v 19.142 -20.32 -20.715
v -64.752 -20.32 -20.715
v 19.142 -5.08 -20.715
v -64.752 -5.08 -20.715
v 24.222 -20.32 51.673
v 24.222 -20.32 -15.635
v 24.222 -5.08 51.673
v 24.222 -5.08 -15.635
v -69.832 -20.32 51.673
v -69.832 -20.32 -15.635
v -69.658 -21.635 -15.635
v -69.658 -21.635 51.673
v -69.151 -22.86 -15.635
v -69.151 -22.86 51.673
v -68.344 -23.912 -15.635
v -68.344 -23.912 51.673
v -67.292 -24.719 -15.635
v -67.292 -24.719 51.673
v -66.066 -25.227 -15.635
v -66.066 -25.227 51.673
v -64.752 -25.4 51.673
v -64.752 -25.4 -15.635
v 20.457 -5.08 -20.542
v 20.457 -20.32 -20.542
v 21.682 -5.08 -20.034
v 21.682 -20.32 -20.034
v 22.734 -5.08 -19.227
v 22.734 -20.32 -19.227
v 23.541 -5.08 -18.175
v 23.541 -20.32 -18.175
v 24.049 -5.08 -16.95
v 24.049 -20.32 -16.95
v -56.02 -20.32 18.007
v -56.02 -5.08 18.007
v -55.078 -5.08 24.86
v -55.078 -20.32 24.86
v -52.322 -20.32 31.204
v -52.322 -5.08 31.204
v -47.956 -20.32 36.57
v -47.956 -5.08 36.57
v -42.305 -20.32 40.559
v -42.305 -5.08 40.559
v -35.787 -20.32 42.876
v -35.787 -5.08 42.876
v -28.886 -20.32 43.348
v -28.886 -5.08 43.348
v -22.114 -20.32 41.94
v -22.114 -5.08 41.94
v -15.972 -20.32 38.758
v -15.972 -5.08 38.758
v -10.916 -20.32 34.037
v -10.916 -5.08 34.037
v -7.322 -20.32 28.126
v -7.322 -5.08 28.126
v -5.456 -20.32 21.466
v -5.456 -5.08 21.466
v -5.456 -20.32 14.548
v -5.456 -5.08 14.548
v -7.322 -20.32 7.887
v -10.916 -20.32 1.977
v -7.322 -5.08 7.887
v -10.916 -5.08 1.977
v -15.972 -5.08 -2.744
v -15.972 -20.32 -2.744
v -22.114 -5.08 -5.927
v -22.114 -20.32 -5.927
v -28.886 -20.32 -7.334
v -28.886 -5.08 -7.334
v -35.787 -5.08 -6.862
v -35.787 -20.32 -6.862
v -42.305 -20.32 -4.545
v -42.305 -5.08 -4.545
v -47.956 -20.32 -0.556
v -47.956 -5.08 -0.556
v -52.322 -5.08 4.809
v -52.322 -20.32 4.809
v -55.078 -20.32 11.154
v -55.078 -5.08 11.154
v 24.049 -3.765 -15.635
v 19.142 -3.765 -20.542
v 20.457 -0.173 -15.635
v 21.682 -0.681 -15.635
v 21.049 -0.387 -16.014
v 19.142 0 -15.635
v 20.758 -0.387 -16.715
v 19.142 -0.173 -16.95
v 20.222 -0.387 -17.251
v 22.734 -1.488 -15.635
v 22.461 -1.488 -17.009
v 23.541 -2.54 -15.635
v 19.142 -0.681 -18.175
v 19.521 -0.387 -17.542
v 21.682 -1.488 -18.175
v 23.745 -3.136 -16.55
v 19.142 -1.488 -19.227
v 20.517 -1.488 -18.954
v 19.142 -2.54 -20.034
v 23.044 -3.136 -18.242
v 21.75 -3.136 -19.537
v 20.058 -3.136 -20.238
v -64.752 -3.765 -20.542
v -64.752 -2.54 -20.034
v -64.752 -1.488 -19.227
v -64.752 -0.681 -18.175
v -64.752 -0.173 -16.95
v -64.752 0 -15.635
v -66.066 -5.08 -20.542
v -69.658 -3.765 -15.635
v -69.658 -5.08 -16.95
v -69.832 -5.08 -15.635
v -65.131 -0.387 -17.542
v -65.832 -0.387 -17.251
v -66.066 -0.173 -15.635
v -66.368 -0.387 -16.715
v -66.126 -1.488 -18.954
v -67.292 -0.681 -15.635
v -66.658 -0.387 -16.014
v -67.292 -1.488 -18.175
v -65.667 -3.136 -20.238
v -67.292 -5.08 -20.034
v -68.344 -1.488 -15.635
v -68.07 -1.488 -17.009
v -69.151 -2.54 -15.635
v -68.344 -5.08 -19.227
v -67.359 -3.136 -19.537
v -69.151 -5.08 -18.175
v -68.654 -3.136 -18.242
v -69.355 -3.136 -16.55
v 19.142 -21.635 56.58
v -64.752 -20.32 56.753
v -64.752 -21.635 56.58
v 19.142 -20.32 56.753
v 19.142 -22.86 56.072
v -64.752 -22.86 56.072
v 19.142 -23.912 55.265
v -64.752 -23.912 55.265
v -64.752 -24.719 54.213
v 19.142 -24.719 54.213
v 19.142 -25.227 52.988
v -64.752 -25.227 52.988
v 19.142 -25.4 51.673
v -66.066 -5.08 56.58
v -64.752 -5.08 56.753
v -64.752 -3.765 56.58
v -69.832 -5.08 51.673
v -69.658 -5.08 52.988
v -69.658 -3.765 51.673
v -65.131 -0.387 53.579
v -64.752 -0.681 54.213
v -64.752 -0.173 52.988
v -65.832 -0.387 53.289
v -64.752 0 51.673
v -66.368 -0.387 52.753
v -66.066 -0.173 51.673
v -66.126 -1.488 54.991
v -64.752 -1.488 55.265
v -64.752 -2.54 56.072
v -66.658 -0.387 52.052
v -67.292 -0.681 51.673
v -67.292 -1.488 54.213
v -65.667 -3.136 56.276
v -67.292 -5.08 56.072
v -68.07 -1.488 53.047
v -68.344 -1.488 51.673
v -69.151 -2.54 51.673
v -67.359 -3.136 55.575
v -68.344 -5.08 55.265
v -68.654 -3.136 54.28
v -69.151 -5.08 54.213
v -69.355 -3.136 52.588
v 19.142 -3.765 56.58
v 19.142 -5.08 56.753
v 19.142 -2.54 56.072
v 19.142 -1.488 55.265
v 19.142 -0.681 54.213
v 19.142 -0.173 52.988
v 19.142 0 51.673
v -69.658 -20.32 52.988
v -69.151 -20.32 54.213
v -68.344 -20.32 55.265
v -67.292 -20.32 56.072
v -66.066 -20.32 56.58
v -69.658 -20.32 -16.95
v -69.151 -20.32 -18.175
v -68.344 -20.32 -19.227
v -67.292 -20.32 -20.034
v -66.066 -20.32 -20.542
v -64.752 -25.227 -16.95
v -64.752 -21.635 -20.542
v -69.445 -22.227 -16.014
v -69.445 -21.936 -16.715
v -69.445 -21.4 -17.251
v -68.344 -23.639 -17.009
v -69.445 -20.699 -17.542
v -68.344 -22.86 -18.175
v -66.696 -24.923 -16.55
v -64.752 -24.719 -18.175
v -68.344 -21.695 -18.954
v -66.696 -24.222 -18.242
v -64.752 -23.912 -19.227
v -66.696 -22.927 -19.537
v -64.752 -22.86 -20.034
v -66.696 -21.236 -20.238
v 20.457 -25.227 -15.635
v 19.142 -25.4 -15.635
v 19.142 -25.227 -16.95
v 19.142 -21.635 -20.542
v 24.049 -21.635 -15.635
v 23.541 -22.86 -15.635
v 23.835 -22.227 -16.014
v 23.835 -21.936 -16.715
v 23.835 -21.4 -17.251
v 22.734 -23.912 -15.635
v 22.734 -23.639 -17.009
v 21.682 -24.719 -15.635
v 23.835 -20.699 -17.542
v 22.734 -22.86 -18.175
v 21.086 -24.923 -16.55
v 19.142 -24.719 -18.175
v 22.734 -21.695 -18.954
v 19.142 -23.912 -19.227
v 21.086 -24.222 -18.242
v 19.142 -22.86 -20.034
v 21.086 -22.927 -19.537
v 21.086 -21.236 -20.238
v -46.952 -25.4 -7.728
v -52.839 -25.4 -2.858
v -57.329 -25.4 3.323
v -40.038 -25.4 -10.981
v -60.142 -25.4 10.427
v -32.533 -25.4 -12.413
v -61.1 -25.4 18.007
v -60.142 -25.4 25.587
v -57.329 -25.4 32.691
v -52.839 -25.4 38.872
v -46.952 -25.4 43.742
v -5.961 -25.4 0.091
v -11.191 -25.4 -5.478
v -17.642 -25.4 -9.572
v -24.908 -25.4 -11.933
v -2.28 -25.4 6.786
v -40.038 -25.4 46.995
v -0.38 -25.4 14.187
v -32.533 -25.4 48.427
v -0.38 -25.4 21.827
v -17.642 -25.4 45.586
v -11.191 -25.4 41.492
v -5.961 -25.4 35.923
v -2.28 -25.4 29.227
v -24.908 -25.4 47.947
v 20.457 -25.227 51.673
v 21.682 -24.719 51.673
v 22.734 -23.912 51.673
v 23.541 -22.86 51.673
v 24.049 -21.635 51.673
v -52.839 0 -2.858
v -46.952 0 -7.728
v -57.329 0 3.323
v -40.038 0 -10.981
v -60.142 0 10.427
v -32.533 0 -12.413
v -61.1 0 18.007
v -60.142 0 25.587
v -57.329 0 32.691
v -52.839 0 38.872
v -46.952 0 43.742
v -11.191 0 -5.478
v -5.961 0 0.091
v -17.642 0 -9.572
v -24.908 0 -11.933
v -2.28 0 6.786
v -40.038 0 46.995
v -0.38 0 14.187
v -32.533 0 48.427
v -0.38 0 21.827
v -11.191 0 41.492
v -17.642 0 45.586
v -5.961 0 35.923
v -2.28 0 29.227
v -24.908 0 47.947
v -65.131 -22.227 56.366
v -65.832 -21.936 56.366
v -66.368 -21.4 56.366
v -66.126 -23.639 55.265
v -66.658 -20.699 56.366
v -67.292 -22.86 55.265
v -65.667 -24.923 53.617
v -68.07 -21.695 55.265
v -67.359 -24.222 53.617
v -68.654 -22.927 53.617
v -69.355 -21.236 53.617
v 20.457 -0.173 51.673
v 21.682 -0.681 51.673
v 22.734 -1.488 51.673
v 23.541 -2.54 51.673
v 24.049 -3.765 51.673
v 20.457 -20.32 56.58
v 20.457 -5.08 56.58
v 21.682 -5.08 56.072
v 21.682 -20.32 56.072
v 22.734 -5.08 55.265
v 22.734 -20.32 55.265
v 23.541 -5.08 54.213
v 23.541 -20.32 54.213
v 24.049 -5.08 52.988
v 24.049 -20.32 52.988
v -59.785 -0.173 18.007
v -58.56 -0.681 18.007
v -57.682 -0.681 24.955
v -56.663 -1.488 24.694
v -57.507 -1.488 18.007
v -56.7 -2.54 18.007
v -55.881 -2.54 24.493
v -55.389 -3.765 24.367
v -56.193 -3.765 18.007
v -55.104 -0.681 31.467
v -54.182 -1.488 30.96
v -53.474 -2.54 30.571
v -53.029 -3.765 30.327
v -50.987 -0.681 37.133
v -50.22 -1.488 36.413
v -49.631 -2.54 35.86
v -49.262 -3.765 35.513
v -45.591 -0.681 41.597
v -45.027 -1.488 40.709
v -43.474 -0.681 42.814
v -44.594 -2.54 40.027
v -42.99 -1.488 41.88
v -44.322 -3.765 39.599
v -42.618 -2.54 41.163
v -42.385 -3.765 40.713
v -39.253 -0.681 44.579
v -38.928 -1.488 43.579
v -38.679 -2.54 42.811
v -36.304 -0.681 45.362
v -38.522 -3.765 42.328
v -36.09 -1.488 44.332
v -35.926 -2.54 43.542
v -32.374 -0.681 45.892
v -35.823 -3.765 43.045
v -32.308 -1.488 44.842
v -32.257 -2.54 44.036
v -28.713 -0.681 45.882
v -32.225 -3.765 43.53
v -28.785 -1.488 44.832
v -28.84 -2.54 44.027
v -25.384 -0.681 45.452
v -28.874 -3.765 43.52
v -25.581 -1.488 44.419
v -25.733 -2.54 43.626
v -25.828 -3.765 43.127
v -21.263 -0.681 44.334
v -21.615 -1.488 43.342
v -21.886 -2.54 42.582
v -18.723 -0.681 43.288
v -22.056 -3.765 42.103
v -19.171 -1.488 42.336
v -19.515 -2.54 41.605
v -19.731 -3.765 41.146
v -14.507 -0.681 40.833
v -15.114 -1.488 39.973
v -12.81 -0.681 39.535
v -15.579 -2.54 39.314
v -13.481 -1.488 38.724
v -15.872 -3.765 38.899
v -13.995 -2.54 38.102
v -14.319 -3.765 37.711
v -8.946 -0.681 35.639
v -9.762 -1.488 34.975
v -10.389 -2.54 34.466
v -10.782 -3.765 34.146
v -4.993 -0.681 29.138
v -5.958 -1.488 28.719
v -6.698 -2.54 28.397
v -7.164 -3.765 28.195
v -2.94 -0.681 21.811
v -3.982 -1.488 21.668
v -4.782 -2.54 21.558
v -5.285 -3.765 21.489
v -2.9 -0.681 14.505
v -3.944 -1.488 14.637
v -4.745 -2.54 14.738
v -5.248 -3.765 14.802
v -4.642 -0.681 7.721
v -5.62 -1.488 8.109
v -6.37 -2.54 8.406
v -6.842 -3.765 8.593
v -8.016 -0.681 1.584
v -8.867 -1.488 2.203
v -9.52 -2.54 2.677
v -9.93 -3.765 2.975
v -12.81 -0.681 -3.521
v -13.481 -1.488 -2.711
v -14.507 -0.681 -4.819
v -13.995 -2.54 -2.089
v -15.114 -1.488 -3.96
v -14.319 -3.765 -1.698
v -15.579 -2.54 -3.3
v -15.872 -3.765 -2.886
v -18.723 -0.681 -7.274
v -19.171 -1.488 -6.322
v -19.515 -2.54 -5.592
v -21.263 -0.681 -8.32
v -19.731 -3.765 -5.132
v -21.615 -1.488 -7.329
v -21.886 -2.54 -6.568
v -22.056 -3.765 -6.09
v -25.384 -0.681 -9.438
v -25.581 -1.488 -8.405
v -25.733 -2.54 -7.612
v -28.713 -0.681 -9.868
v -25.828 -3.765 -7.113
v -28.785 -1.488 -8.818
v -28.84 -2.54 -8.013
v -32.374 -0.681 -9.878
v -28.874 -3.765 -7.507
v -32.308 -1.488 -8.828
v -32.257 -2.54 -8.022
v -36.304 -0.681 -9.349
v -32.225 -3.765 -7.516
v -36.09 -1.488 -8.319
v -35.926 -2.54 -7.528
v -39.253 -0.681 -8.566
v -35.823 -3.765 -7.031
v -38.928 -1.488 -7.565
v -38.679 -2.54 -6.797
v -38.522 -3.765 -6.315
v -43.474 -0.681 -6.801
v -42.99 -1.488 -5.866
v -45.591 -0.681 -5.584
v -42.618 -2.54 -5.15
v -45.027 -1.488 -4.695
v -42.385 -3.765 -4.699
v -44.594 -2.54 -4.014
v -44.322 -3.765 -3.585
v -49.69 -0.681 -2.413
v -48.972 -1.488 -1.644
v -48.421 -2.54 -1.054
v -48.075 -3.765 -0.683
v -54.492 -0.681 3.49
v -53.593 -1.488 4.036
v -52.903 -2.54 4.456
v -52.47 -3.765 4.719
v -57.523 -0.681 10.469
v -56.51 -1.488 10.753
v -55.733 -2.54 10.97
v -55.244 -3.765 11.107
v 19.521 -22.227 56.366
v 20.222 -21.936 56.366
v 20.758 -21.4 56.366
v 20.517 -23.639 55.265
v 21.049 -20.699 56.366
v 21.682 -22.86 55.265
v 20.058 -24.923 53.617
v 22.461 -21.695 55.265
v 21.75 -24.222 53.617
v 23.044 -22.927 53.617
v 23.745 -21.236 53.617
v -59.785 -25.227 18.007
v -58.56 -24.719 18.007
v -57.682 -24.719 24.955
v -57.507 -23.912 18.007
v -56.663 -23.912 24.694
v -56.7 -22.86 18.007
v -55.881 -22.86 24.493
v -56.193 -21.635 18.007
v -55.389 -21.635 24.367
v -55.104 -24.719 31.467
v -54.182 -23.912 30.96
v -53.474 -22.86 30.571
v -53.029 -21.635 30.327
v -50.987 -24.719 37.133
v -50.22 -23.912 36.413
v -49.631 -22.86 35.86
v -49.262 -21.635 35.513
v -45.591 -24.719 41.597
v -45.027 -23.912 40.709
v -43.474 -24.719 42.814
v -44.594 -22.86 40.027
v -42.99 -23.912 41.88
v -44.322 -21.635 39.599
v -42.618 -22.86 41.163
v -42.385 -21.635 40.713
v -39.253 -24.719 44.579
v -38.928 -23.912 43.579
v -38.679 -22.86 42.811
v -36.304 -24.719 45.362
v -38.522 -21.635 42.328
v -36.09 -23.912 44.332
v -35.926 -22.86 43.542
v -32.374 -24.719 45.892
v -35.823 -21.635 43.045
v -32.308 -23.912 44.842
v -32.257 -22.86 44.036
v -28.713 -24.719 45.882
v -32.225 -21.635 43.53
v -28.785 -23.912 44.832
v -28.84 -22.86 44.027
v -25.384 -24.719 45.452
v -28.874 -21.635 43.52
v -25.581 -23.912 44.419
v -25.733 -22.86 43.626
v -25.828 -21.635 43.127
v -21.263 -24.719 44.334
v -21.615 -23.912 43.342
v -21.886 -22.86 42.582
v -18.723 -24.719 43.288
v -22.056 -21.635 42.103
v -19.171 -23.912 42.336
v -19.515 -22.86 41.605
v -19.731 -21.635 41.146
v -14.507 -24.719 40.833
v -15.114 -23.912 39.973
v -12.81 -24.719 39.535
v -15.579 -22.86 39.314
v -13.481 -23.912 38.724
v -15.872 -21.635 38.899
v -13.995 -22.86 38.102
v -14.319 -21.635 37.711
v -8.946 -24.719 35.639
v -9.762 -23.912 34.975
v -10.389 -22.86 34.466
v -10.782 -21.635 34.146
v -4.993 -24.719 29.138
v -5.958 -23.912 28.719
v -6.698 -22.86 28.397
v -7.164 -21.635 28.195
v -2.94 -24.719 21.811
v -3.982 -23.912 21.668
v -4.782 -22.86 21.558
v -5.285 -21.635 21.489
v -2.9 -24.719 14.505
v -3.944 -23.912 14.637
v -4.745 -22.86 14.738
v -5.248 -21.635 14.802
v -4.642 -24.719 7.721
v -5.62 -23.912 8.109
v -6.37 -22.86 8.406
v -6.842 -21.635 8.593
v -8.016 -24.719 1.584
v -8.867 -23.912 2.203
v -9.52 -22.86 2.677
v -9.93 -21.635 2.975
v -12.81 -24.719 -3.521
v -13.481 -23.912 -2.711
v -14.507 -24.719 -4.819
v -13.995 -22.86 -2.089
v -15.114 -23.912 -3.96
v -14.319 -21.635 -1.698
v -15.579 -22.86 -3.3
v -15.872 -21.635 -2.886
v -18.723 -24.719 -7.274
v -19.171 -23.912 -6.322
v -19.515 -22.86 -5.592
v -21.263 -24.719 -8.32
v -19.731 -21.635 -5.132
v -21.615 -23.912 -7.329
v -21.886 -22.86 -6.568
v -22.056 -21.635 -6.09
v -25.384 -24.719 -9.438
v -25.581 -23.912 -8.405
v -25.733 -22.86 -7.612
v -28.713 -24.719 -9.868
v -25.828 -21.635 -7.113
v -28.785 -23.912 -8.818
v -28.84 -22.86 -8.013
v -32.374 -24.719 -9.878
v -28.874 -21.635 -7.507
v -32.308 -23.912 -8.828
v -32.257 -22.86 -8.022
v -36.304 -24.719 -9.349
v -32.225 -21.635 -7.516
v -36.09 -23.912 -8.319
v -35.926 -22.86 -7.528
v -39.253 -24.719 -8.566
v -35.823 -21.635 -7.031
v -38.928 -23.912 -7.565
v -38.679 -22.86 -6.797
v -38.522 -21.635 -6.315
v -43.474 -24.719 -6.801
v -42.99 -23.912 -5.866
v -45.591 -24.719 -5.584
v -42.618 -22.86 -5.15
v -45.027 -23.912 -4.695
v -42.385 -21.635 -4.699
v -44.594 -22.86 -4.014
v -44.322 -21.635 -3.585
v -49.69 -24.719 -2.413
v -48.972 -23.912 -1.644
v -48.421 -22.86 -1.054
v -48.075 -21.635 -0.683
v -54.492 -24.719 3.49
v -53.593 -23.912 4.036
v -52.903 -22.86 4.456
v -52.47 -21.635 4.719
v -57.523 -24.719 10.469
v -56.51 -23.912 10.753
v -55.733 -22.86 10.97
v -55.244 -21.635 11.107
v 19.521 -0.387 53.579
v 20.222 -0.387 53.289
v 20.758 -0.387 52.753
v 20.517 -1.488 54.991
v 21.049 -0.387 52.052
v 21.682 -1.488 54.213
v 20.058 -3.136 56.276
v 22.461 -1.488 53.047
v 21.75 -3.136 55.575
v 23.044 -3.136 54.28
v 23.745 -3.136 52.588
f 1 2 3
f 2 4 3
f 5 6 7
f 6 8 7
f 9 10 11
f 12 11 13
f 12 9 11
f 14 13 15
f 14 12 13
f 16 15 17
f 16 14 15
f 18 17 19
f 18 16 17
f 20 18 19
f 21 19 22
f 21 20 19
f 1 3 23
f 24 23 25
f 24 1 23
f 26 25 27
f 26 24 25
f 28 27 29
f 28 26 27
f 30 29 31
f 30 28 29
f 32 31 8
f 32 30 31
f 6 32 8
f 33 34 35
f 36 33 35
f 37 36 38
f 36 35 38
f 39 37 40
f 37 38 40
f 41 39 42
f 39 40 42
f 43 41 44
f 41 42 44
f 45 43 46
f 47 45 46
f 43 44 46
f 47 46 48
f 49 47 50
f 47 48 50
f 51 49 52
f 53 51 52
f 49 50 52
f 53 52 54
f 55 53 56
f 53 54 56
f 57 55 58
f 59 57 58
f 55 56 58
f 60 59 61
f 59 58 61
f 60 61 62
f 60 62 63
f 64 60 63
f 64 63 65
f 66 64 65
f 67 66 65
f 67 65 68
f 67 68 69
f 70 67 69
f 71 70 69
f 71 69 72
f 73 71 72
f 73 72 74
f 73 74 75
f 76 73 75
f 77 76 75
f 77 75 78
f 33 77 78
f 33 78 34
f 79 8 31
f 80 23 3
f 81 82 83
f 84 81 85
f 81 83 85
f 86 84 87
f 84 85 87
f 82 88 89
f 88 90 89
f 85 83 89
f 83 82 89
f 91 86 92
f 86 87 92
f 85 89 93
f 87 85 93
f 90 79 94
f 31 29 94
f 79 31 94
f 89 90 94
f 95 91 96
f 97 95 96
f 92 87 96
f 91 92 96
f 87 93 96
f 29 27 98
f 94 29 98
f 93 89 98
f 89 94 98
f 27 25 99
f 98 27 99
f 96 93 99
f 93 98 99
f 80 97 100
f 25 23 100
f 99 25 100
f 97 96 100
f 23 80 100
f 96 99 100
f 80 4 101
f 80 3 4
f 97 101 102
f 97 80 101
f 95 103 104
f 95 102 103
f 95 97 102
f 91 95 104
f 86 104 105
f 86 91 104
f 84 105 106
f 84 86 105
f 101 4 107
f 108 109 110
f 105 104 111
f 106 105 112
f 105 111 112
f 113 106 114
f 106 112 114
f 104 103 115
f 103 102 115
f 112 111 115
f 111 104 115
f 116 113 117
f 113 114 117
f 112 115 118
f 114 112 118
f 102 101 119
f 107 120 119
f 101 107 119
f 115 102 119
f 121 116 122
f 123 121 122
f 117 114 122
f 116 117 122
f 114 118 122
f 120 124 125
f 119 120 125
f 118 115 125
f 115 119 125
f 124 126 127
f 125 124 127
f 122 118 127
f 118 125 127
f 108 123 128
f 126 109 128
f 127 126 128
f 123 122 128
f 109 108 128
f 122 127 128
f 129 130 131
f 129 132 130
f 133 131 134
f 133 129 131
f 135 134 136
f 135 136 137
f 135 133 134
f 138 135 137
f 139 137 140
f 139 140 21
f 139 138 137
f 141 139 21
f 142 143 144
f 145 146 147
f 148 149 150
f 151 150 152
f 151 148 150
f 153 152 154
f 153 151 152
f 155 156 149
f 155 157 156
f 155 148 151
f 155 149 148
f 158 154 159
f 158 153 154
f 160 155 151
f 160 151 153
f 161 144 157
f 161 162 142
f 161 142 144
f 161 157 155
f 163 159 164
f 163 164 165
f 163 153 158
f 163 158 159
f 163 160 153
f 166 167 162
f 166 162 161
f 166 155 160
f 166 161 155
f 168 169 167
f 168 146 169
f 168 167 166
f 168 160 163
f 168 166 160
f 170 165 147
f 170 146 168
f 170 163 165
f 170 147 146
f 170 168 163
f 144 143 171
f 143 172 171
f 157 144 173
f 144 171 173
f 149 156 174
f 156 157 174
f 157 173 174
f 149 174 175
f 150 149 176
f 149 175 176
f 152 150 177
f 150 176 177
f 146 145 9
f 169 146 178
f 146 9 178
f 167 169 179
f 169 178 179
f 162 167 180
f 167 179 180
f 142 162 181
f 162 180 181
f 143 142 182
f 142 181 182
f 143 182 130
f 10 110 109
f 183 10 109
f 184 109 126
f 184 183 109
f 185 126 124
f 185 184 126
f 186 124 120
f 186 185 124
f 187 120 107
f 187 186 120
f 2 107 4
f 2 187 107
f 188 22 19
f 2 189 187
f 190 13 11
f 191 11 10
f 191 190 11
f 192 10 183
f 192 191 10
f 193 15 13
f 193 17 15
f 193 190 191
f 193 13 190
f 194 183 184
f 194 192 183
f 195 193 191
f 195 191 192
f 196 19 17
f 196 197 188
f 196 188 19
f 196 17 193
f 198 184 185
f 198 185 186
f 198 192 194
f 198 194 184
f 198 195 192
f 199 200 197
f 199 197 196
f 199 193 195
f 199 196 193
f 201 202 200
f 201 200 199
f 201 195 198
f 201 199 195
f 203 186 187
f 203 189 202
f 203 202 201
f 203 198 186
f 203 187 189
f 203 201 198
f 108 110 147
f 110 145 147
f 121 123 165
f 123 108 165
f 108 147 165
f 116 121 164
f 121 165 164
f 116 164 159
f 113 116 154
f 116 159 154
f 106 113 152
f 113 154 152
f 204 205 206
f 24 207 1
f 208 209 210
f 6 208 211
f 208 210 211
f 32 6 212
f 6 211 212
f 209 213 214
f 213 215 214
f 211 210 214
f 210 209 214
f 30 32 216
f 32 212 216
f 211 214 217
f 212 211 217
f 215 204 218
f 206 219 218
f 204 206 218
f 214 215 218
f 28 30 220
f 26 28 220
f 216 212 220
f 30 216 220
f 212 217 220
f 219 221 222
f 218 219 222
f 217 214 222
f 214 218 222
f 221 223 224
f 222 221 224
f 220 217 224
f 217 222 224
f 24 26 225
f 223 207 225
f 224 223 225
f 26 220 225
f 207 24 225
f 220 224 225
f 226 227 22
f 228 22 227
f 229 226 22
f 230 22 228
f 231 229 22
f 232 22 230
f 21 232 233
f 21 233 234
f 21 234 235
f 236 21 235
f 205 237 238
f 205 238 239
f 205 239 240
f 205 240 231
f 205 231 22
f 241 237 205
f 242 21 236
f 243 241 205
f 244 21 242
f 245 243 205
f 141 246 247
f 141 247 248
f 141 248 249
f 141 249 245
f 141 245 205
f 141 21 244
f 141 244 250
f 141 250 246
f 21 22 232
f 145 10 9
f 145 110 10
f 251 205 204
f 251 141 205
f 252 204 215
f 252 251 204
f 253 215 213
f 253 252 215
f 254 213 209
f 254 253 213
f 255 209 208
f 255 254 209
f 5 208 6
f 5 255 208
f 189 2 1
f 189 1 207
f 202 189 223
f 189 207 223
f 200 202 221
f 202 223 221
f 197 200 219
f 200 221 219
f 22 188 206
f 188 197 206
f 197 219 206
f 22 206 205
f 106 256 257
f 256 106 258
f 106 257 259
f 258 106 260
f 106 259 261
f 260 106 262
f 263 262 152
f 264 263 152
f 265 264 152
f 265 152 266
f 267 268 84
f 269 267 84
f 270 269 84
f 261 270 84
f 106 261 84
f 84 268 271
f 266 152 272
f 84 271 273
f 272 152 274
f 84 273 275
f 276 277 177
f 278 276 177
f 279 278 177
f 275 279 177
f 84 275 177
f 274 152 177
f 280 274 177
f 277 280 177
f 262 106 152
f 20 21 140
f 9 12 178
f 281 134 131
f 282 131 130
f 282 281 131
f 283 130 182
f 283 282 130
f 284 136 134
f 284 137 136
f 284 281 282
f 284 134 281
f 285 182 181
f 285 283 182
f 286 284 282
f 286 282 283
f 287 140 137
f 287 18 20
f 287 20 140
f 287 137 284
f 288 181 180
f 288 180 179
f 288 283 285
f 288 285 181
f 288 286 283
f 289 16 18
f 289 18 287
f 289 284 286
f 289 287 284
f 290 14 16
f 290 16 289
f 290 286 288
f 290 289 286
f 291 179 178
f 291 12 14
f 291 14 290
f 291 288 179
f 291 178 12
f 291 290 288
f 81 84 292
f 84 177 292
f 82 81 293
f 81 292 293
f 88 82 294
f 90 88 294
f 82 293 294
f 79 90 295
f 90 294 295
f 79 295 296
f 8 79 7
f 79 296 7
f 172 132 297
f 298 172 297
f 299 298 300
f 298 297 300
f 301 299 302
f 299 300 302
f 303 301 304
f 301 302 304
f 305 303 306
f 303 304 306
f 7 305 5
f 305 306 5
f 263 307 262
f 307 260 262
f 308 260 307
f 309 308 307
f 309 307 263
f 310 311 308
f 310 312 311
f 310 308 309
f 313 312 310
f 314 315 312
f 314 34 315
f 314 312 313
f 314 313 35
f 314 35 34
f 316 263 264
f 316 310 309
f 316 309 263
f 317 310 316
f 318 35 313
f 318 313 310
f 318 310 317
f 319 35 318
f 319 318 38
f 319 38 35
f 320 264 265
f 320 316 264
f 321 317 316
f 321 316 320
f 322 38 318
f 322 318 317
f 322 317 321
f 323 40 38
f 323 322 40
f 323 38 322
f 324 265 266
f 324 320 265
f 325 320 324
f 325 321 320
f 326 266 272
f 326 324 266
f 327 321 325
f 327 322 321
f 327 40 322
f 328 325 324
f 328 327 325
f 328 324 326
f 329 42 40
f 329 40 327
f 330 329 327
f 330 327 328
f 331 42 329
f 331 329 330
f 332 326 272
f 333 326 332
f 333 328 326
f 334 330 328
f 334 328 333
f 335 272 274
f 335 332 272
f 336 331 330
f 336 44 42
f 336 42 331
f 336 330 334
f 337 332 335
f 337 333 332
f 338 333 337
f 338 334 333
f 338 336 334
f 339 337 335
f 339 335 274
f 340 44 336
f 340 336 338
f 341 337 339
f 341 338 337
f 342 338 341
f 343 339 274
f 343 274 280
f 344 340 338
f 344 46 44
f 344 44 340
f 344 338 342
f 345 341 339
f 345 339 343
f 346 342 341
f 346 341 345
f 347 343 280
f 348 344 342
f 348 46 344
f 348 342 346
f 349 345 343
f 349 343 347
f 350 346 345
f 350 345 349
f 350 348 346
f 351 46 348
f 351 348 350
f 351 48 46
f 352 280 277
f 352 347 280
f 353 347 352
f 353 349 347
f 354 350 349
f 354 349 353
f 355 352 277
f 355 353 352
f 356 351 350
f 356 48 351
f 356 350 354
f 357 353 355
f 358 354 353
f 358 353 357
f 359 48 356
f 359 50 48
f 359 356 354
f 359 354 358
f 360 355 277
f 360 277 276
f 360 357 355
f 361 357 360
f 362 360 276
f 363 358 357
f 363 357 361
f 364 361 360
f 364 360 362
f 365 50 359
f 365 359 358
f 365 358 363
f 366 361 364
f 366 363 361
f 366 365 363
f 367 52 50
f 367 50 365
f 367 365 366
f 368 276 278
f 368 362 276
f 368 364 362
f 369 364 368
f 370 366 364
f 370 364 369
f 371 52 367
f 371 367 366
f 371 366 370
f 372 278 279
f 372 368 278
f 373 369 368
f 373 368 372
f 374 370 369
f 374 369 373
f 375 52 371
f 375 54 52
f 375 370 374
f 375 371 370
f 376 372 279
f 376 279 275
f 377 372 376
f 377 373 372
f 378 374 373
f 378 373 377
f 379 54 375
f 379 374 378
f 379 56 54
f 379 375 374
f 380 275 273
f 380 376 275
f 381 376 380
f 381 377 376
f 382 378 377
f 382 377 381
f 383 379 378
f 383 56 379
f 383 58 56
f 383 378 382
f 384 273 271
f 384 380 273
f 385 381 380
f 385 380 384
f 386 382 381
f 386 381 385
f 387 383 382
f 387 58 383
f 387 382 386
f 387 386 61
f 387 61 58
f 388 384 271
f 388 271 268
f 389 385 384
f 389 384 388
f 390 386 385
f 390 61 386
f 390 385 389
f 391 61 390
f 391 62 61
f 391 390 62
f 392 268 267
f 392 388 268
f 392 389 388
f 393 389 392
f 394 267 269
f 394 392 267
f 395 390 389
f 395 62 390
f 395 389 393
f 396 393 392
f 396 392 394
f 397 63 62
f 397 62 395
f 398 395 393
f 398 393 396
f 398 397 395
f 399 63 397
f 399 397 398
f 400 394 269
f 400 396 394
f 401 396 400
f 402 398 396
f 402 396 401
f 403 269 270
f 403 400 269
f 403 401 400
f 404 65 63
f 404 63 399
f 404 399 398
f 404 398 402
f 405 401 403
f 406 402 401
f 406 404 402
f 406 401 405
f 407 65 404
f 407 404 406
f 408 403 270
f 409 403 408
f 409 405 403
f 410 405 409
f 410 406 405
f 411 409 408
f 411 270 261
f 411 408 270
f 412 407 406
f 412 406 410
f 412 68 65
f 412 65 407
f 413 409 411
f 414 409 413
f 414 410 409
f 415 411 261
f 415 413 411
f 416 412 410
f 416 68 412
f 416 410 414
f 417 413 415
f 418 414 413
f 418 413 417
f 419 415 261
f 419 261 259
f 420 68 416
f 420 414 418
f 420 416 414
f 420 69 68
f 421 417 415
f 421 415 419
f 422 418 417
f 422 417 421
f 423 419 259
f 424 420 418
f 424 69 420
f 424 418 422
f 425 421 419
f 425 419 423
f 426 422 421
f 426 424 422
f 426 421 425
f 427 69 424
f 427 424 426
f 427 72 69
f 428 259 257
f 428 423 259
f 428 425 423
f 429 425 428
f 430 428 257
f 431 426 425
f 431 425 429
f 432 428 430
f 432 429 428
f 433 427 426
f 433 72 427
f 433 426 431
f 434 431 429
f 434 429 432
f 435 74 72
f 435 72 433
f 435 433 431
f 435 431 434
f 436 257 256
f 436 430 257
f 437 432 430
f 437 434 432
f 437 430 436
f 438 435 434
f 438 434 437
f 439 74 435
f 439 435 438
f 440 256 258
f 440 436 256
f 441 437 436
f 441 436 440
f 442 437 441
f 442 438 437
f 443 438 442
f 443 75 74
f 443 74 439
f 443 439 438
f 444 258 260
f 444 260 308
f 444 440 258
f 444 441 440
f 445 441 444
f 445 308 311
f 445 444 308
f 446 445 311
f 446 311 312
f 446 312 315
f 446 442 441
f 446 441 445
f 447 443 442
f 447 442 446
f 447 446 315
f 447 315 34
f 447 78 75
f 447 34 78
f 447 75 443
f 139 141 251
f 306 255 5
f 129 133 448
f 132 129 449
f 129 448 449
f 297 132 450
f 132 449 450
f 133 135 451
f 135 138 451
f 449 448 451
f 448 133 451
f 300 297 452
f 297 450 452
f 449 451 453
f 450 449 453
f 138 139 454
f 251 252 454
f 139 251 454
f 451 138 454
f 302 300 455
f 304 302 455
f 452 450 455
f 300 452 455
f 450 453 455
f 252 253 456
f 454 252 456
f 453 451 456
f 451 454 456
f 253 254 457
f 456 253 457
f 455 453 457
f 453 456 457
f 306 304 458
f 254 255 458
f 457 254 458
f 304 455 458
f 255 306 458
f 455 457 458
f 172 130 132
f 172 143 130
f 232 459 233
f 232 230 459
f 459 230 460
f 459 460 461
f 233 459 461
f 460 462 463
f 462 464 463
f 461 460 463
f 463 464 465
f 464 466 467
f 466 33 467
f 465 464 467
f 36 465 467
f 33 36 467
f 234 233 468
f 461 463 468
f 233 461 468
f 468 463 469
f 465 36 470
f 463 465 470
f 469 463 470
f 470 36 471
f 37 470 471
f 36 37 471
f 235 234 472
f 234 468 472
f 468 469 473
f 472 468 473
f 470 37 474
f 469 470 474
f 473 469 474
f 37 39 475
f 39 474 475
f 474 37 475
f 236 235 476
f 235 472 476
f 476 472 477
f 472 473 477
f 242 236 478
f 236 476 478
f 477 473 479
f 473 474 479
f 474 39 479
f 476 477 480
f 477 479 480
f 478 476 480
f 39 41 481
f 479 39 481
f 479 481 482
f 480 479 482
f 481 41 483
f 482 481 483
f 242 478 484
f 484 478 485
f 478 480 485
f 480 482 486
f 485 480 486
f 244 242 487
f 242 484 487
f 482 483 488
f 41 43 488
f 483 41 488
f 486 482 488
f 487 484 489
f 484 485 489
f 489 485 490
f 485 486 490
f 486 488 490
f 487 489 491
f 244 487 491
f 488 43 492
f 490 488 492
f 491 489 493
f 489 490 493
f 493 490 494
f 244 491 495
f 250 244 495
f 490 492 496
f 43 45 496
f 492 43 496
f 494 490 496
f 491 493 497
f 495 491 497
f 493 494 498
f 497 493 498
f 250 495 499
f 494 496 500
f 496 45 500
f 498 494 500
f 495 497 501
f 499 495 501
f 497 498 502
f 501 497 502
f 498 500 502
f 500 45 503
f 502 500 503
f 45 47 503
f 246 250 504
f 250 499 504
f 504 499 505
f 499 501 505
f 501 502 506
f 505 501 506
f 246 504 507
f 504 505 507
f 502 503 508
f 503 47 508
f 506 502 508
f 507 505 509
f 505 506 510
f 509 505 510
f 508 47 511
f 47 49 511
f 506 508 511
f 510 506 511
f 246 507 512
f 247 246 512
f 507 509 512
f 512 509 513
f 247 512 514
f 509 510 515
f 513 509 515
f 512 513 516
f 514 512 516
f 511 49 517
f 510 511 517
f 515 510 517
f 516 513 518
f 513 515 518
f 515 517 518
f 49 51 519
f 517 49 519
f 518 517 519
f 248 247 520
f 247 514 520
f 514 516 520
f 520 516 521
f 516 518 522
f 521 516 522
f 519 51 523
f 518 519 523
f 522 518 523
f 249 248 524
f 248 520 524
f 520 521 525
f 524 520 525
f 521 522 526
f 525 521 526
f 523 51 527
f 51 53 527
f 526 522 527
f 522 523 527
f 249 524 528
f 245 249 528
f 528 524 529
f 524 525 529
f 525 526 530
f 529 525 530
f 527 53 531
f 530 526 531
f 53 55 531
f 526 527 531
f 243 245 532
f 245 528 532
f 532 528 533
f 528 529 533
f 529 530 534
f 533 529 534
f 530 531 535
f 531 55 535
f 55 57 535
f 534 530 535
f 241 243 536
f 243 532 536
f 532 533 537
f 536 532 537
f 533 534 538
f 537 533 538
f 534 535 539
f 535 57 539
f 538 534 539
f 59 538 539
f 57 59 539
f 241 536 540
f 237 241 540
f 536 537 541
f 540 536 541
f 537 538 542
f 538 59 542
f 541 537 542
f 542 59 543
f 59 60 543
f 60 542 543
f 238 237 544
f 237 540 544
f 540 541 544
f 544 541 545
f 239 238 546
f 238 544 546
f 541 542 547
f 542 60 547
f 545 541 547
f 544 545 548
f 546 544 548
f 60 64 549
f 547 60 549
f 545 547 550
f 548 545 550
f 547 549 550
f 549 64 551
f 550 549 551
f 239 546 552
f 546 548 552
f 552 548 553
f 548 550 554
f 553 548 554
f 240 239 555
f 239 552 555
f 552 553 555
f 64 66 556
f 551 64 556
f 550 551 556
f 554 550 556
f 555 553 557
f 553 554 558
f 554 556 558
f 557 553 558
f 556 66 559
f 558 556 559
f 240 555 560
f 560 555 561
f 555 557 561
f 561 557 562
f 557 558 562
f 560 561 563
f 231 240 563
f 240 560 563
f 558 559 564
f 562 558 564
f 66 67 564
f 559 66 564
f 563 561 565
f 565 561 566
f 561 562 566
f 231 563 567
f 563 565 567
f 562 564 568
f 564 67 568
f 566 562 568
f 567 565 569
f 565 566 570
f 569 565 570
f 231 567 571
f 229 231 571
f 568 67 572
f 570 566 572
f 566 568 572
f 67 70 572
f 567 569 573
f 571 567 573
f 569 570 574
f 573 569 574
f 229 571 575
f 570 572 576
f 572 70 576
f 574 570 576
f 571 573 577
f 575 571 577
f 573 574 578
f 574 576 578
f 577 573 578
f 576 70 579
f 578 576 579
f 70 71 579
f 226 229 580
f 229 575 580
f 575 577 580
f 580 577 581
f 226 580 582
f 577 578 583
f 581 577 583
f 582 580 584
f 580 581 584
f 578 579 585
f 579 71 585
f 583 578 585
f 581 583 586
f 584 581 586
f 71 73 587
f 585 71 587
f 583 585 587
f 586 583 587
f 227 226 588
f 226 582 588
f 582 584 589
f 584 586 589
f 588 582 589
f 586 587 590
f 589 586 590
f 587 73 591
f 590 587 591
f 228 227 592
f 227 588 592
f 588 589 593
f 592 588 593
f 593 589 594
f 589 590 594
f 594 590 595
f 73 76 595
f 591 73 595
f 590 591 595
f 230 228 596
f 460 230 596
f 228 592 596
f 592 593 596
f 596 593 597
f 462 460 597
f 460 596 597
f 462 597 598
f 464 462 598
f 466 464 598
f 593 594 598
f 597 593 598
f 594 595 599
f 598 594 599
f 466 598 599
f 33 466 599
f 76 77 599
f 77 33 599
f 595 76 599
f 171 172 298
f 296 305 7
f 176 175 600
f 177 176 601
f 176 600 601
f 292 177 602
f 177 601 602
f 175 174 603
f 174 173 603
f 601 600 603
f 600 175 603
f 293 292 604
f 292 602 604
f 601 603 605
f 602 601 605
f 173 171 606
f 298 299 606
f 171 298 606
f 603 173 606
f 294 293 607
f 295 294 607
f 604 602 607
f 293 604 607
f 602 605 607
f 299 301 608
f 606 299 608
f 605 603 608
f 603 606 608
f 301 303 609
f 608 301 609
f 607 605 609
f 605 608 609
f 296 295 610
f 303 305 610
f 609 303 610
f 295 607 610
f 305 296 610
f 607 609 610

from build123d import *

# Parameters (mm, degrees)
F0_W     = 94.0536260605
F0_H     = 77.4676054716
F1_DEPTH = 25.4
F3_D     = 50.8
F4_R     = 5.08


with BuildPart() as f1:
    # F0 (on Front) → F1 (new body)
    with BuildSketch(Plane.XZ):
        with Locations((-22.8047668934, 18.0189460516)):
            Rectangle(F0_W, F0_H)
    extrude(amount=F1_DEPTH)

    # F3 (through all)
    with Locations(Plane.XZ.offset(25.4)):
        with Locations((-30.6195504963, 18.0068686604)):
            Hole(F3_D / 2)

    # F4
    f4_edges = [f1.edges().sort_by_distance(p)[0] for p in [
        (-22.804767, -25.4, -20.714857),
        (-69.83158, -25.4, 18.018946),
        (24.222046, -25.4, 18.018946),
        (-22.804767, -25.4, 56.752749),
        (-56.01955, -25.4, 18.006869),
        (24.222046, -12.7, 56.752749),
        (-69.83158, -12.7, 56.752749),
        (-22.804767, 0, 56.752749),
        (24.222046, -12.7, -20.714857),
        (24.222046, 0, 18.018946),
        (-69.83158, -12.7, -20.714857),
        (-22.804767, 0, -20.714857),
        (-69.83158, 0, 18.018946),
        (-56.01955, 0, 18.006869),
    ]]
    fillet(f4_edges, radius=F4_R)


solid = f1.part
